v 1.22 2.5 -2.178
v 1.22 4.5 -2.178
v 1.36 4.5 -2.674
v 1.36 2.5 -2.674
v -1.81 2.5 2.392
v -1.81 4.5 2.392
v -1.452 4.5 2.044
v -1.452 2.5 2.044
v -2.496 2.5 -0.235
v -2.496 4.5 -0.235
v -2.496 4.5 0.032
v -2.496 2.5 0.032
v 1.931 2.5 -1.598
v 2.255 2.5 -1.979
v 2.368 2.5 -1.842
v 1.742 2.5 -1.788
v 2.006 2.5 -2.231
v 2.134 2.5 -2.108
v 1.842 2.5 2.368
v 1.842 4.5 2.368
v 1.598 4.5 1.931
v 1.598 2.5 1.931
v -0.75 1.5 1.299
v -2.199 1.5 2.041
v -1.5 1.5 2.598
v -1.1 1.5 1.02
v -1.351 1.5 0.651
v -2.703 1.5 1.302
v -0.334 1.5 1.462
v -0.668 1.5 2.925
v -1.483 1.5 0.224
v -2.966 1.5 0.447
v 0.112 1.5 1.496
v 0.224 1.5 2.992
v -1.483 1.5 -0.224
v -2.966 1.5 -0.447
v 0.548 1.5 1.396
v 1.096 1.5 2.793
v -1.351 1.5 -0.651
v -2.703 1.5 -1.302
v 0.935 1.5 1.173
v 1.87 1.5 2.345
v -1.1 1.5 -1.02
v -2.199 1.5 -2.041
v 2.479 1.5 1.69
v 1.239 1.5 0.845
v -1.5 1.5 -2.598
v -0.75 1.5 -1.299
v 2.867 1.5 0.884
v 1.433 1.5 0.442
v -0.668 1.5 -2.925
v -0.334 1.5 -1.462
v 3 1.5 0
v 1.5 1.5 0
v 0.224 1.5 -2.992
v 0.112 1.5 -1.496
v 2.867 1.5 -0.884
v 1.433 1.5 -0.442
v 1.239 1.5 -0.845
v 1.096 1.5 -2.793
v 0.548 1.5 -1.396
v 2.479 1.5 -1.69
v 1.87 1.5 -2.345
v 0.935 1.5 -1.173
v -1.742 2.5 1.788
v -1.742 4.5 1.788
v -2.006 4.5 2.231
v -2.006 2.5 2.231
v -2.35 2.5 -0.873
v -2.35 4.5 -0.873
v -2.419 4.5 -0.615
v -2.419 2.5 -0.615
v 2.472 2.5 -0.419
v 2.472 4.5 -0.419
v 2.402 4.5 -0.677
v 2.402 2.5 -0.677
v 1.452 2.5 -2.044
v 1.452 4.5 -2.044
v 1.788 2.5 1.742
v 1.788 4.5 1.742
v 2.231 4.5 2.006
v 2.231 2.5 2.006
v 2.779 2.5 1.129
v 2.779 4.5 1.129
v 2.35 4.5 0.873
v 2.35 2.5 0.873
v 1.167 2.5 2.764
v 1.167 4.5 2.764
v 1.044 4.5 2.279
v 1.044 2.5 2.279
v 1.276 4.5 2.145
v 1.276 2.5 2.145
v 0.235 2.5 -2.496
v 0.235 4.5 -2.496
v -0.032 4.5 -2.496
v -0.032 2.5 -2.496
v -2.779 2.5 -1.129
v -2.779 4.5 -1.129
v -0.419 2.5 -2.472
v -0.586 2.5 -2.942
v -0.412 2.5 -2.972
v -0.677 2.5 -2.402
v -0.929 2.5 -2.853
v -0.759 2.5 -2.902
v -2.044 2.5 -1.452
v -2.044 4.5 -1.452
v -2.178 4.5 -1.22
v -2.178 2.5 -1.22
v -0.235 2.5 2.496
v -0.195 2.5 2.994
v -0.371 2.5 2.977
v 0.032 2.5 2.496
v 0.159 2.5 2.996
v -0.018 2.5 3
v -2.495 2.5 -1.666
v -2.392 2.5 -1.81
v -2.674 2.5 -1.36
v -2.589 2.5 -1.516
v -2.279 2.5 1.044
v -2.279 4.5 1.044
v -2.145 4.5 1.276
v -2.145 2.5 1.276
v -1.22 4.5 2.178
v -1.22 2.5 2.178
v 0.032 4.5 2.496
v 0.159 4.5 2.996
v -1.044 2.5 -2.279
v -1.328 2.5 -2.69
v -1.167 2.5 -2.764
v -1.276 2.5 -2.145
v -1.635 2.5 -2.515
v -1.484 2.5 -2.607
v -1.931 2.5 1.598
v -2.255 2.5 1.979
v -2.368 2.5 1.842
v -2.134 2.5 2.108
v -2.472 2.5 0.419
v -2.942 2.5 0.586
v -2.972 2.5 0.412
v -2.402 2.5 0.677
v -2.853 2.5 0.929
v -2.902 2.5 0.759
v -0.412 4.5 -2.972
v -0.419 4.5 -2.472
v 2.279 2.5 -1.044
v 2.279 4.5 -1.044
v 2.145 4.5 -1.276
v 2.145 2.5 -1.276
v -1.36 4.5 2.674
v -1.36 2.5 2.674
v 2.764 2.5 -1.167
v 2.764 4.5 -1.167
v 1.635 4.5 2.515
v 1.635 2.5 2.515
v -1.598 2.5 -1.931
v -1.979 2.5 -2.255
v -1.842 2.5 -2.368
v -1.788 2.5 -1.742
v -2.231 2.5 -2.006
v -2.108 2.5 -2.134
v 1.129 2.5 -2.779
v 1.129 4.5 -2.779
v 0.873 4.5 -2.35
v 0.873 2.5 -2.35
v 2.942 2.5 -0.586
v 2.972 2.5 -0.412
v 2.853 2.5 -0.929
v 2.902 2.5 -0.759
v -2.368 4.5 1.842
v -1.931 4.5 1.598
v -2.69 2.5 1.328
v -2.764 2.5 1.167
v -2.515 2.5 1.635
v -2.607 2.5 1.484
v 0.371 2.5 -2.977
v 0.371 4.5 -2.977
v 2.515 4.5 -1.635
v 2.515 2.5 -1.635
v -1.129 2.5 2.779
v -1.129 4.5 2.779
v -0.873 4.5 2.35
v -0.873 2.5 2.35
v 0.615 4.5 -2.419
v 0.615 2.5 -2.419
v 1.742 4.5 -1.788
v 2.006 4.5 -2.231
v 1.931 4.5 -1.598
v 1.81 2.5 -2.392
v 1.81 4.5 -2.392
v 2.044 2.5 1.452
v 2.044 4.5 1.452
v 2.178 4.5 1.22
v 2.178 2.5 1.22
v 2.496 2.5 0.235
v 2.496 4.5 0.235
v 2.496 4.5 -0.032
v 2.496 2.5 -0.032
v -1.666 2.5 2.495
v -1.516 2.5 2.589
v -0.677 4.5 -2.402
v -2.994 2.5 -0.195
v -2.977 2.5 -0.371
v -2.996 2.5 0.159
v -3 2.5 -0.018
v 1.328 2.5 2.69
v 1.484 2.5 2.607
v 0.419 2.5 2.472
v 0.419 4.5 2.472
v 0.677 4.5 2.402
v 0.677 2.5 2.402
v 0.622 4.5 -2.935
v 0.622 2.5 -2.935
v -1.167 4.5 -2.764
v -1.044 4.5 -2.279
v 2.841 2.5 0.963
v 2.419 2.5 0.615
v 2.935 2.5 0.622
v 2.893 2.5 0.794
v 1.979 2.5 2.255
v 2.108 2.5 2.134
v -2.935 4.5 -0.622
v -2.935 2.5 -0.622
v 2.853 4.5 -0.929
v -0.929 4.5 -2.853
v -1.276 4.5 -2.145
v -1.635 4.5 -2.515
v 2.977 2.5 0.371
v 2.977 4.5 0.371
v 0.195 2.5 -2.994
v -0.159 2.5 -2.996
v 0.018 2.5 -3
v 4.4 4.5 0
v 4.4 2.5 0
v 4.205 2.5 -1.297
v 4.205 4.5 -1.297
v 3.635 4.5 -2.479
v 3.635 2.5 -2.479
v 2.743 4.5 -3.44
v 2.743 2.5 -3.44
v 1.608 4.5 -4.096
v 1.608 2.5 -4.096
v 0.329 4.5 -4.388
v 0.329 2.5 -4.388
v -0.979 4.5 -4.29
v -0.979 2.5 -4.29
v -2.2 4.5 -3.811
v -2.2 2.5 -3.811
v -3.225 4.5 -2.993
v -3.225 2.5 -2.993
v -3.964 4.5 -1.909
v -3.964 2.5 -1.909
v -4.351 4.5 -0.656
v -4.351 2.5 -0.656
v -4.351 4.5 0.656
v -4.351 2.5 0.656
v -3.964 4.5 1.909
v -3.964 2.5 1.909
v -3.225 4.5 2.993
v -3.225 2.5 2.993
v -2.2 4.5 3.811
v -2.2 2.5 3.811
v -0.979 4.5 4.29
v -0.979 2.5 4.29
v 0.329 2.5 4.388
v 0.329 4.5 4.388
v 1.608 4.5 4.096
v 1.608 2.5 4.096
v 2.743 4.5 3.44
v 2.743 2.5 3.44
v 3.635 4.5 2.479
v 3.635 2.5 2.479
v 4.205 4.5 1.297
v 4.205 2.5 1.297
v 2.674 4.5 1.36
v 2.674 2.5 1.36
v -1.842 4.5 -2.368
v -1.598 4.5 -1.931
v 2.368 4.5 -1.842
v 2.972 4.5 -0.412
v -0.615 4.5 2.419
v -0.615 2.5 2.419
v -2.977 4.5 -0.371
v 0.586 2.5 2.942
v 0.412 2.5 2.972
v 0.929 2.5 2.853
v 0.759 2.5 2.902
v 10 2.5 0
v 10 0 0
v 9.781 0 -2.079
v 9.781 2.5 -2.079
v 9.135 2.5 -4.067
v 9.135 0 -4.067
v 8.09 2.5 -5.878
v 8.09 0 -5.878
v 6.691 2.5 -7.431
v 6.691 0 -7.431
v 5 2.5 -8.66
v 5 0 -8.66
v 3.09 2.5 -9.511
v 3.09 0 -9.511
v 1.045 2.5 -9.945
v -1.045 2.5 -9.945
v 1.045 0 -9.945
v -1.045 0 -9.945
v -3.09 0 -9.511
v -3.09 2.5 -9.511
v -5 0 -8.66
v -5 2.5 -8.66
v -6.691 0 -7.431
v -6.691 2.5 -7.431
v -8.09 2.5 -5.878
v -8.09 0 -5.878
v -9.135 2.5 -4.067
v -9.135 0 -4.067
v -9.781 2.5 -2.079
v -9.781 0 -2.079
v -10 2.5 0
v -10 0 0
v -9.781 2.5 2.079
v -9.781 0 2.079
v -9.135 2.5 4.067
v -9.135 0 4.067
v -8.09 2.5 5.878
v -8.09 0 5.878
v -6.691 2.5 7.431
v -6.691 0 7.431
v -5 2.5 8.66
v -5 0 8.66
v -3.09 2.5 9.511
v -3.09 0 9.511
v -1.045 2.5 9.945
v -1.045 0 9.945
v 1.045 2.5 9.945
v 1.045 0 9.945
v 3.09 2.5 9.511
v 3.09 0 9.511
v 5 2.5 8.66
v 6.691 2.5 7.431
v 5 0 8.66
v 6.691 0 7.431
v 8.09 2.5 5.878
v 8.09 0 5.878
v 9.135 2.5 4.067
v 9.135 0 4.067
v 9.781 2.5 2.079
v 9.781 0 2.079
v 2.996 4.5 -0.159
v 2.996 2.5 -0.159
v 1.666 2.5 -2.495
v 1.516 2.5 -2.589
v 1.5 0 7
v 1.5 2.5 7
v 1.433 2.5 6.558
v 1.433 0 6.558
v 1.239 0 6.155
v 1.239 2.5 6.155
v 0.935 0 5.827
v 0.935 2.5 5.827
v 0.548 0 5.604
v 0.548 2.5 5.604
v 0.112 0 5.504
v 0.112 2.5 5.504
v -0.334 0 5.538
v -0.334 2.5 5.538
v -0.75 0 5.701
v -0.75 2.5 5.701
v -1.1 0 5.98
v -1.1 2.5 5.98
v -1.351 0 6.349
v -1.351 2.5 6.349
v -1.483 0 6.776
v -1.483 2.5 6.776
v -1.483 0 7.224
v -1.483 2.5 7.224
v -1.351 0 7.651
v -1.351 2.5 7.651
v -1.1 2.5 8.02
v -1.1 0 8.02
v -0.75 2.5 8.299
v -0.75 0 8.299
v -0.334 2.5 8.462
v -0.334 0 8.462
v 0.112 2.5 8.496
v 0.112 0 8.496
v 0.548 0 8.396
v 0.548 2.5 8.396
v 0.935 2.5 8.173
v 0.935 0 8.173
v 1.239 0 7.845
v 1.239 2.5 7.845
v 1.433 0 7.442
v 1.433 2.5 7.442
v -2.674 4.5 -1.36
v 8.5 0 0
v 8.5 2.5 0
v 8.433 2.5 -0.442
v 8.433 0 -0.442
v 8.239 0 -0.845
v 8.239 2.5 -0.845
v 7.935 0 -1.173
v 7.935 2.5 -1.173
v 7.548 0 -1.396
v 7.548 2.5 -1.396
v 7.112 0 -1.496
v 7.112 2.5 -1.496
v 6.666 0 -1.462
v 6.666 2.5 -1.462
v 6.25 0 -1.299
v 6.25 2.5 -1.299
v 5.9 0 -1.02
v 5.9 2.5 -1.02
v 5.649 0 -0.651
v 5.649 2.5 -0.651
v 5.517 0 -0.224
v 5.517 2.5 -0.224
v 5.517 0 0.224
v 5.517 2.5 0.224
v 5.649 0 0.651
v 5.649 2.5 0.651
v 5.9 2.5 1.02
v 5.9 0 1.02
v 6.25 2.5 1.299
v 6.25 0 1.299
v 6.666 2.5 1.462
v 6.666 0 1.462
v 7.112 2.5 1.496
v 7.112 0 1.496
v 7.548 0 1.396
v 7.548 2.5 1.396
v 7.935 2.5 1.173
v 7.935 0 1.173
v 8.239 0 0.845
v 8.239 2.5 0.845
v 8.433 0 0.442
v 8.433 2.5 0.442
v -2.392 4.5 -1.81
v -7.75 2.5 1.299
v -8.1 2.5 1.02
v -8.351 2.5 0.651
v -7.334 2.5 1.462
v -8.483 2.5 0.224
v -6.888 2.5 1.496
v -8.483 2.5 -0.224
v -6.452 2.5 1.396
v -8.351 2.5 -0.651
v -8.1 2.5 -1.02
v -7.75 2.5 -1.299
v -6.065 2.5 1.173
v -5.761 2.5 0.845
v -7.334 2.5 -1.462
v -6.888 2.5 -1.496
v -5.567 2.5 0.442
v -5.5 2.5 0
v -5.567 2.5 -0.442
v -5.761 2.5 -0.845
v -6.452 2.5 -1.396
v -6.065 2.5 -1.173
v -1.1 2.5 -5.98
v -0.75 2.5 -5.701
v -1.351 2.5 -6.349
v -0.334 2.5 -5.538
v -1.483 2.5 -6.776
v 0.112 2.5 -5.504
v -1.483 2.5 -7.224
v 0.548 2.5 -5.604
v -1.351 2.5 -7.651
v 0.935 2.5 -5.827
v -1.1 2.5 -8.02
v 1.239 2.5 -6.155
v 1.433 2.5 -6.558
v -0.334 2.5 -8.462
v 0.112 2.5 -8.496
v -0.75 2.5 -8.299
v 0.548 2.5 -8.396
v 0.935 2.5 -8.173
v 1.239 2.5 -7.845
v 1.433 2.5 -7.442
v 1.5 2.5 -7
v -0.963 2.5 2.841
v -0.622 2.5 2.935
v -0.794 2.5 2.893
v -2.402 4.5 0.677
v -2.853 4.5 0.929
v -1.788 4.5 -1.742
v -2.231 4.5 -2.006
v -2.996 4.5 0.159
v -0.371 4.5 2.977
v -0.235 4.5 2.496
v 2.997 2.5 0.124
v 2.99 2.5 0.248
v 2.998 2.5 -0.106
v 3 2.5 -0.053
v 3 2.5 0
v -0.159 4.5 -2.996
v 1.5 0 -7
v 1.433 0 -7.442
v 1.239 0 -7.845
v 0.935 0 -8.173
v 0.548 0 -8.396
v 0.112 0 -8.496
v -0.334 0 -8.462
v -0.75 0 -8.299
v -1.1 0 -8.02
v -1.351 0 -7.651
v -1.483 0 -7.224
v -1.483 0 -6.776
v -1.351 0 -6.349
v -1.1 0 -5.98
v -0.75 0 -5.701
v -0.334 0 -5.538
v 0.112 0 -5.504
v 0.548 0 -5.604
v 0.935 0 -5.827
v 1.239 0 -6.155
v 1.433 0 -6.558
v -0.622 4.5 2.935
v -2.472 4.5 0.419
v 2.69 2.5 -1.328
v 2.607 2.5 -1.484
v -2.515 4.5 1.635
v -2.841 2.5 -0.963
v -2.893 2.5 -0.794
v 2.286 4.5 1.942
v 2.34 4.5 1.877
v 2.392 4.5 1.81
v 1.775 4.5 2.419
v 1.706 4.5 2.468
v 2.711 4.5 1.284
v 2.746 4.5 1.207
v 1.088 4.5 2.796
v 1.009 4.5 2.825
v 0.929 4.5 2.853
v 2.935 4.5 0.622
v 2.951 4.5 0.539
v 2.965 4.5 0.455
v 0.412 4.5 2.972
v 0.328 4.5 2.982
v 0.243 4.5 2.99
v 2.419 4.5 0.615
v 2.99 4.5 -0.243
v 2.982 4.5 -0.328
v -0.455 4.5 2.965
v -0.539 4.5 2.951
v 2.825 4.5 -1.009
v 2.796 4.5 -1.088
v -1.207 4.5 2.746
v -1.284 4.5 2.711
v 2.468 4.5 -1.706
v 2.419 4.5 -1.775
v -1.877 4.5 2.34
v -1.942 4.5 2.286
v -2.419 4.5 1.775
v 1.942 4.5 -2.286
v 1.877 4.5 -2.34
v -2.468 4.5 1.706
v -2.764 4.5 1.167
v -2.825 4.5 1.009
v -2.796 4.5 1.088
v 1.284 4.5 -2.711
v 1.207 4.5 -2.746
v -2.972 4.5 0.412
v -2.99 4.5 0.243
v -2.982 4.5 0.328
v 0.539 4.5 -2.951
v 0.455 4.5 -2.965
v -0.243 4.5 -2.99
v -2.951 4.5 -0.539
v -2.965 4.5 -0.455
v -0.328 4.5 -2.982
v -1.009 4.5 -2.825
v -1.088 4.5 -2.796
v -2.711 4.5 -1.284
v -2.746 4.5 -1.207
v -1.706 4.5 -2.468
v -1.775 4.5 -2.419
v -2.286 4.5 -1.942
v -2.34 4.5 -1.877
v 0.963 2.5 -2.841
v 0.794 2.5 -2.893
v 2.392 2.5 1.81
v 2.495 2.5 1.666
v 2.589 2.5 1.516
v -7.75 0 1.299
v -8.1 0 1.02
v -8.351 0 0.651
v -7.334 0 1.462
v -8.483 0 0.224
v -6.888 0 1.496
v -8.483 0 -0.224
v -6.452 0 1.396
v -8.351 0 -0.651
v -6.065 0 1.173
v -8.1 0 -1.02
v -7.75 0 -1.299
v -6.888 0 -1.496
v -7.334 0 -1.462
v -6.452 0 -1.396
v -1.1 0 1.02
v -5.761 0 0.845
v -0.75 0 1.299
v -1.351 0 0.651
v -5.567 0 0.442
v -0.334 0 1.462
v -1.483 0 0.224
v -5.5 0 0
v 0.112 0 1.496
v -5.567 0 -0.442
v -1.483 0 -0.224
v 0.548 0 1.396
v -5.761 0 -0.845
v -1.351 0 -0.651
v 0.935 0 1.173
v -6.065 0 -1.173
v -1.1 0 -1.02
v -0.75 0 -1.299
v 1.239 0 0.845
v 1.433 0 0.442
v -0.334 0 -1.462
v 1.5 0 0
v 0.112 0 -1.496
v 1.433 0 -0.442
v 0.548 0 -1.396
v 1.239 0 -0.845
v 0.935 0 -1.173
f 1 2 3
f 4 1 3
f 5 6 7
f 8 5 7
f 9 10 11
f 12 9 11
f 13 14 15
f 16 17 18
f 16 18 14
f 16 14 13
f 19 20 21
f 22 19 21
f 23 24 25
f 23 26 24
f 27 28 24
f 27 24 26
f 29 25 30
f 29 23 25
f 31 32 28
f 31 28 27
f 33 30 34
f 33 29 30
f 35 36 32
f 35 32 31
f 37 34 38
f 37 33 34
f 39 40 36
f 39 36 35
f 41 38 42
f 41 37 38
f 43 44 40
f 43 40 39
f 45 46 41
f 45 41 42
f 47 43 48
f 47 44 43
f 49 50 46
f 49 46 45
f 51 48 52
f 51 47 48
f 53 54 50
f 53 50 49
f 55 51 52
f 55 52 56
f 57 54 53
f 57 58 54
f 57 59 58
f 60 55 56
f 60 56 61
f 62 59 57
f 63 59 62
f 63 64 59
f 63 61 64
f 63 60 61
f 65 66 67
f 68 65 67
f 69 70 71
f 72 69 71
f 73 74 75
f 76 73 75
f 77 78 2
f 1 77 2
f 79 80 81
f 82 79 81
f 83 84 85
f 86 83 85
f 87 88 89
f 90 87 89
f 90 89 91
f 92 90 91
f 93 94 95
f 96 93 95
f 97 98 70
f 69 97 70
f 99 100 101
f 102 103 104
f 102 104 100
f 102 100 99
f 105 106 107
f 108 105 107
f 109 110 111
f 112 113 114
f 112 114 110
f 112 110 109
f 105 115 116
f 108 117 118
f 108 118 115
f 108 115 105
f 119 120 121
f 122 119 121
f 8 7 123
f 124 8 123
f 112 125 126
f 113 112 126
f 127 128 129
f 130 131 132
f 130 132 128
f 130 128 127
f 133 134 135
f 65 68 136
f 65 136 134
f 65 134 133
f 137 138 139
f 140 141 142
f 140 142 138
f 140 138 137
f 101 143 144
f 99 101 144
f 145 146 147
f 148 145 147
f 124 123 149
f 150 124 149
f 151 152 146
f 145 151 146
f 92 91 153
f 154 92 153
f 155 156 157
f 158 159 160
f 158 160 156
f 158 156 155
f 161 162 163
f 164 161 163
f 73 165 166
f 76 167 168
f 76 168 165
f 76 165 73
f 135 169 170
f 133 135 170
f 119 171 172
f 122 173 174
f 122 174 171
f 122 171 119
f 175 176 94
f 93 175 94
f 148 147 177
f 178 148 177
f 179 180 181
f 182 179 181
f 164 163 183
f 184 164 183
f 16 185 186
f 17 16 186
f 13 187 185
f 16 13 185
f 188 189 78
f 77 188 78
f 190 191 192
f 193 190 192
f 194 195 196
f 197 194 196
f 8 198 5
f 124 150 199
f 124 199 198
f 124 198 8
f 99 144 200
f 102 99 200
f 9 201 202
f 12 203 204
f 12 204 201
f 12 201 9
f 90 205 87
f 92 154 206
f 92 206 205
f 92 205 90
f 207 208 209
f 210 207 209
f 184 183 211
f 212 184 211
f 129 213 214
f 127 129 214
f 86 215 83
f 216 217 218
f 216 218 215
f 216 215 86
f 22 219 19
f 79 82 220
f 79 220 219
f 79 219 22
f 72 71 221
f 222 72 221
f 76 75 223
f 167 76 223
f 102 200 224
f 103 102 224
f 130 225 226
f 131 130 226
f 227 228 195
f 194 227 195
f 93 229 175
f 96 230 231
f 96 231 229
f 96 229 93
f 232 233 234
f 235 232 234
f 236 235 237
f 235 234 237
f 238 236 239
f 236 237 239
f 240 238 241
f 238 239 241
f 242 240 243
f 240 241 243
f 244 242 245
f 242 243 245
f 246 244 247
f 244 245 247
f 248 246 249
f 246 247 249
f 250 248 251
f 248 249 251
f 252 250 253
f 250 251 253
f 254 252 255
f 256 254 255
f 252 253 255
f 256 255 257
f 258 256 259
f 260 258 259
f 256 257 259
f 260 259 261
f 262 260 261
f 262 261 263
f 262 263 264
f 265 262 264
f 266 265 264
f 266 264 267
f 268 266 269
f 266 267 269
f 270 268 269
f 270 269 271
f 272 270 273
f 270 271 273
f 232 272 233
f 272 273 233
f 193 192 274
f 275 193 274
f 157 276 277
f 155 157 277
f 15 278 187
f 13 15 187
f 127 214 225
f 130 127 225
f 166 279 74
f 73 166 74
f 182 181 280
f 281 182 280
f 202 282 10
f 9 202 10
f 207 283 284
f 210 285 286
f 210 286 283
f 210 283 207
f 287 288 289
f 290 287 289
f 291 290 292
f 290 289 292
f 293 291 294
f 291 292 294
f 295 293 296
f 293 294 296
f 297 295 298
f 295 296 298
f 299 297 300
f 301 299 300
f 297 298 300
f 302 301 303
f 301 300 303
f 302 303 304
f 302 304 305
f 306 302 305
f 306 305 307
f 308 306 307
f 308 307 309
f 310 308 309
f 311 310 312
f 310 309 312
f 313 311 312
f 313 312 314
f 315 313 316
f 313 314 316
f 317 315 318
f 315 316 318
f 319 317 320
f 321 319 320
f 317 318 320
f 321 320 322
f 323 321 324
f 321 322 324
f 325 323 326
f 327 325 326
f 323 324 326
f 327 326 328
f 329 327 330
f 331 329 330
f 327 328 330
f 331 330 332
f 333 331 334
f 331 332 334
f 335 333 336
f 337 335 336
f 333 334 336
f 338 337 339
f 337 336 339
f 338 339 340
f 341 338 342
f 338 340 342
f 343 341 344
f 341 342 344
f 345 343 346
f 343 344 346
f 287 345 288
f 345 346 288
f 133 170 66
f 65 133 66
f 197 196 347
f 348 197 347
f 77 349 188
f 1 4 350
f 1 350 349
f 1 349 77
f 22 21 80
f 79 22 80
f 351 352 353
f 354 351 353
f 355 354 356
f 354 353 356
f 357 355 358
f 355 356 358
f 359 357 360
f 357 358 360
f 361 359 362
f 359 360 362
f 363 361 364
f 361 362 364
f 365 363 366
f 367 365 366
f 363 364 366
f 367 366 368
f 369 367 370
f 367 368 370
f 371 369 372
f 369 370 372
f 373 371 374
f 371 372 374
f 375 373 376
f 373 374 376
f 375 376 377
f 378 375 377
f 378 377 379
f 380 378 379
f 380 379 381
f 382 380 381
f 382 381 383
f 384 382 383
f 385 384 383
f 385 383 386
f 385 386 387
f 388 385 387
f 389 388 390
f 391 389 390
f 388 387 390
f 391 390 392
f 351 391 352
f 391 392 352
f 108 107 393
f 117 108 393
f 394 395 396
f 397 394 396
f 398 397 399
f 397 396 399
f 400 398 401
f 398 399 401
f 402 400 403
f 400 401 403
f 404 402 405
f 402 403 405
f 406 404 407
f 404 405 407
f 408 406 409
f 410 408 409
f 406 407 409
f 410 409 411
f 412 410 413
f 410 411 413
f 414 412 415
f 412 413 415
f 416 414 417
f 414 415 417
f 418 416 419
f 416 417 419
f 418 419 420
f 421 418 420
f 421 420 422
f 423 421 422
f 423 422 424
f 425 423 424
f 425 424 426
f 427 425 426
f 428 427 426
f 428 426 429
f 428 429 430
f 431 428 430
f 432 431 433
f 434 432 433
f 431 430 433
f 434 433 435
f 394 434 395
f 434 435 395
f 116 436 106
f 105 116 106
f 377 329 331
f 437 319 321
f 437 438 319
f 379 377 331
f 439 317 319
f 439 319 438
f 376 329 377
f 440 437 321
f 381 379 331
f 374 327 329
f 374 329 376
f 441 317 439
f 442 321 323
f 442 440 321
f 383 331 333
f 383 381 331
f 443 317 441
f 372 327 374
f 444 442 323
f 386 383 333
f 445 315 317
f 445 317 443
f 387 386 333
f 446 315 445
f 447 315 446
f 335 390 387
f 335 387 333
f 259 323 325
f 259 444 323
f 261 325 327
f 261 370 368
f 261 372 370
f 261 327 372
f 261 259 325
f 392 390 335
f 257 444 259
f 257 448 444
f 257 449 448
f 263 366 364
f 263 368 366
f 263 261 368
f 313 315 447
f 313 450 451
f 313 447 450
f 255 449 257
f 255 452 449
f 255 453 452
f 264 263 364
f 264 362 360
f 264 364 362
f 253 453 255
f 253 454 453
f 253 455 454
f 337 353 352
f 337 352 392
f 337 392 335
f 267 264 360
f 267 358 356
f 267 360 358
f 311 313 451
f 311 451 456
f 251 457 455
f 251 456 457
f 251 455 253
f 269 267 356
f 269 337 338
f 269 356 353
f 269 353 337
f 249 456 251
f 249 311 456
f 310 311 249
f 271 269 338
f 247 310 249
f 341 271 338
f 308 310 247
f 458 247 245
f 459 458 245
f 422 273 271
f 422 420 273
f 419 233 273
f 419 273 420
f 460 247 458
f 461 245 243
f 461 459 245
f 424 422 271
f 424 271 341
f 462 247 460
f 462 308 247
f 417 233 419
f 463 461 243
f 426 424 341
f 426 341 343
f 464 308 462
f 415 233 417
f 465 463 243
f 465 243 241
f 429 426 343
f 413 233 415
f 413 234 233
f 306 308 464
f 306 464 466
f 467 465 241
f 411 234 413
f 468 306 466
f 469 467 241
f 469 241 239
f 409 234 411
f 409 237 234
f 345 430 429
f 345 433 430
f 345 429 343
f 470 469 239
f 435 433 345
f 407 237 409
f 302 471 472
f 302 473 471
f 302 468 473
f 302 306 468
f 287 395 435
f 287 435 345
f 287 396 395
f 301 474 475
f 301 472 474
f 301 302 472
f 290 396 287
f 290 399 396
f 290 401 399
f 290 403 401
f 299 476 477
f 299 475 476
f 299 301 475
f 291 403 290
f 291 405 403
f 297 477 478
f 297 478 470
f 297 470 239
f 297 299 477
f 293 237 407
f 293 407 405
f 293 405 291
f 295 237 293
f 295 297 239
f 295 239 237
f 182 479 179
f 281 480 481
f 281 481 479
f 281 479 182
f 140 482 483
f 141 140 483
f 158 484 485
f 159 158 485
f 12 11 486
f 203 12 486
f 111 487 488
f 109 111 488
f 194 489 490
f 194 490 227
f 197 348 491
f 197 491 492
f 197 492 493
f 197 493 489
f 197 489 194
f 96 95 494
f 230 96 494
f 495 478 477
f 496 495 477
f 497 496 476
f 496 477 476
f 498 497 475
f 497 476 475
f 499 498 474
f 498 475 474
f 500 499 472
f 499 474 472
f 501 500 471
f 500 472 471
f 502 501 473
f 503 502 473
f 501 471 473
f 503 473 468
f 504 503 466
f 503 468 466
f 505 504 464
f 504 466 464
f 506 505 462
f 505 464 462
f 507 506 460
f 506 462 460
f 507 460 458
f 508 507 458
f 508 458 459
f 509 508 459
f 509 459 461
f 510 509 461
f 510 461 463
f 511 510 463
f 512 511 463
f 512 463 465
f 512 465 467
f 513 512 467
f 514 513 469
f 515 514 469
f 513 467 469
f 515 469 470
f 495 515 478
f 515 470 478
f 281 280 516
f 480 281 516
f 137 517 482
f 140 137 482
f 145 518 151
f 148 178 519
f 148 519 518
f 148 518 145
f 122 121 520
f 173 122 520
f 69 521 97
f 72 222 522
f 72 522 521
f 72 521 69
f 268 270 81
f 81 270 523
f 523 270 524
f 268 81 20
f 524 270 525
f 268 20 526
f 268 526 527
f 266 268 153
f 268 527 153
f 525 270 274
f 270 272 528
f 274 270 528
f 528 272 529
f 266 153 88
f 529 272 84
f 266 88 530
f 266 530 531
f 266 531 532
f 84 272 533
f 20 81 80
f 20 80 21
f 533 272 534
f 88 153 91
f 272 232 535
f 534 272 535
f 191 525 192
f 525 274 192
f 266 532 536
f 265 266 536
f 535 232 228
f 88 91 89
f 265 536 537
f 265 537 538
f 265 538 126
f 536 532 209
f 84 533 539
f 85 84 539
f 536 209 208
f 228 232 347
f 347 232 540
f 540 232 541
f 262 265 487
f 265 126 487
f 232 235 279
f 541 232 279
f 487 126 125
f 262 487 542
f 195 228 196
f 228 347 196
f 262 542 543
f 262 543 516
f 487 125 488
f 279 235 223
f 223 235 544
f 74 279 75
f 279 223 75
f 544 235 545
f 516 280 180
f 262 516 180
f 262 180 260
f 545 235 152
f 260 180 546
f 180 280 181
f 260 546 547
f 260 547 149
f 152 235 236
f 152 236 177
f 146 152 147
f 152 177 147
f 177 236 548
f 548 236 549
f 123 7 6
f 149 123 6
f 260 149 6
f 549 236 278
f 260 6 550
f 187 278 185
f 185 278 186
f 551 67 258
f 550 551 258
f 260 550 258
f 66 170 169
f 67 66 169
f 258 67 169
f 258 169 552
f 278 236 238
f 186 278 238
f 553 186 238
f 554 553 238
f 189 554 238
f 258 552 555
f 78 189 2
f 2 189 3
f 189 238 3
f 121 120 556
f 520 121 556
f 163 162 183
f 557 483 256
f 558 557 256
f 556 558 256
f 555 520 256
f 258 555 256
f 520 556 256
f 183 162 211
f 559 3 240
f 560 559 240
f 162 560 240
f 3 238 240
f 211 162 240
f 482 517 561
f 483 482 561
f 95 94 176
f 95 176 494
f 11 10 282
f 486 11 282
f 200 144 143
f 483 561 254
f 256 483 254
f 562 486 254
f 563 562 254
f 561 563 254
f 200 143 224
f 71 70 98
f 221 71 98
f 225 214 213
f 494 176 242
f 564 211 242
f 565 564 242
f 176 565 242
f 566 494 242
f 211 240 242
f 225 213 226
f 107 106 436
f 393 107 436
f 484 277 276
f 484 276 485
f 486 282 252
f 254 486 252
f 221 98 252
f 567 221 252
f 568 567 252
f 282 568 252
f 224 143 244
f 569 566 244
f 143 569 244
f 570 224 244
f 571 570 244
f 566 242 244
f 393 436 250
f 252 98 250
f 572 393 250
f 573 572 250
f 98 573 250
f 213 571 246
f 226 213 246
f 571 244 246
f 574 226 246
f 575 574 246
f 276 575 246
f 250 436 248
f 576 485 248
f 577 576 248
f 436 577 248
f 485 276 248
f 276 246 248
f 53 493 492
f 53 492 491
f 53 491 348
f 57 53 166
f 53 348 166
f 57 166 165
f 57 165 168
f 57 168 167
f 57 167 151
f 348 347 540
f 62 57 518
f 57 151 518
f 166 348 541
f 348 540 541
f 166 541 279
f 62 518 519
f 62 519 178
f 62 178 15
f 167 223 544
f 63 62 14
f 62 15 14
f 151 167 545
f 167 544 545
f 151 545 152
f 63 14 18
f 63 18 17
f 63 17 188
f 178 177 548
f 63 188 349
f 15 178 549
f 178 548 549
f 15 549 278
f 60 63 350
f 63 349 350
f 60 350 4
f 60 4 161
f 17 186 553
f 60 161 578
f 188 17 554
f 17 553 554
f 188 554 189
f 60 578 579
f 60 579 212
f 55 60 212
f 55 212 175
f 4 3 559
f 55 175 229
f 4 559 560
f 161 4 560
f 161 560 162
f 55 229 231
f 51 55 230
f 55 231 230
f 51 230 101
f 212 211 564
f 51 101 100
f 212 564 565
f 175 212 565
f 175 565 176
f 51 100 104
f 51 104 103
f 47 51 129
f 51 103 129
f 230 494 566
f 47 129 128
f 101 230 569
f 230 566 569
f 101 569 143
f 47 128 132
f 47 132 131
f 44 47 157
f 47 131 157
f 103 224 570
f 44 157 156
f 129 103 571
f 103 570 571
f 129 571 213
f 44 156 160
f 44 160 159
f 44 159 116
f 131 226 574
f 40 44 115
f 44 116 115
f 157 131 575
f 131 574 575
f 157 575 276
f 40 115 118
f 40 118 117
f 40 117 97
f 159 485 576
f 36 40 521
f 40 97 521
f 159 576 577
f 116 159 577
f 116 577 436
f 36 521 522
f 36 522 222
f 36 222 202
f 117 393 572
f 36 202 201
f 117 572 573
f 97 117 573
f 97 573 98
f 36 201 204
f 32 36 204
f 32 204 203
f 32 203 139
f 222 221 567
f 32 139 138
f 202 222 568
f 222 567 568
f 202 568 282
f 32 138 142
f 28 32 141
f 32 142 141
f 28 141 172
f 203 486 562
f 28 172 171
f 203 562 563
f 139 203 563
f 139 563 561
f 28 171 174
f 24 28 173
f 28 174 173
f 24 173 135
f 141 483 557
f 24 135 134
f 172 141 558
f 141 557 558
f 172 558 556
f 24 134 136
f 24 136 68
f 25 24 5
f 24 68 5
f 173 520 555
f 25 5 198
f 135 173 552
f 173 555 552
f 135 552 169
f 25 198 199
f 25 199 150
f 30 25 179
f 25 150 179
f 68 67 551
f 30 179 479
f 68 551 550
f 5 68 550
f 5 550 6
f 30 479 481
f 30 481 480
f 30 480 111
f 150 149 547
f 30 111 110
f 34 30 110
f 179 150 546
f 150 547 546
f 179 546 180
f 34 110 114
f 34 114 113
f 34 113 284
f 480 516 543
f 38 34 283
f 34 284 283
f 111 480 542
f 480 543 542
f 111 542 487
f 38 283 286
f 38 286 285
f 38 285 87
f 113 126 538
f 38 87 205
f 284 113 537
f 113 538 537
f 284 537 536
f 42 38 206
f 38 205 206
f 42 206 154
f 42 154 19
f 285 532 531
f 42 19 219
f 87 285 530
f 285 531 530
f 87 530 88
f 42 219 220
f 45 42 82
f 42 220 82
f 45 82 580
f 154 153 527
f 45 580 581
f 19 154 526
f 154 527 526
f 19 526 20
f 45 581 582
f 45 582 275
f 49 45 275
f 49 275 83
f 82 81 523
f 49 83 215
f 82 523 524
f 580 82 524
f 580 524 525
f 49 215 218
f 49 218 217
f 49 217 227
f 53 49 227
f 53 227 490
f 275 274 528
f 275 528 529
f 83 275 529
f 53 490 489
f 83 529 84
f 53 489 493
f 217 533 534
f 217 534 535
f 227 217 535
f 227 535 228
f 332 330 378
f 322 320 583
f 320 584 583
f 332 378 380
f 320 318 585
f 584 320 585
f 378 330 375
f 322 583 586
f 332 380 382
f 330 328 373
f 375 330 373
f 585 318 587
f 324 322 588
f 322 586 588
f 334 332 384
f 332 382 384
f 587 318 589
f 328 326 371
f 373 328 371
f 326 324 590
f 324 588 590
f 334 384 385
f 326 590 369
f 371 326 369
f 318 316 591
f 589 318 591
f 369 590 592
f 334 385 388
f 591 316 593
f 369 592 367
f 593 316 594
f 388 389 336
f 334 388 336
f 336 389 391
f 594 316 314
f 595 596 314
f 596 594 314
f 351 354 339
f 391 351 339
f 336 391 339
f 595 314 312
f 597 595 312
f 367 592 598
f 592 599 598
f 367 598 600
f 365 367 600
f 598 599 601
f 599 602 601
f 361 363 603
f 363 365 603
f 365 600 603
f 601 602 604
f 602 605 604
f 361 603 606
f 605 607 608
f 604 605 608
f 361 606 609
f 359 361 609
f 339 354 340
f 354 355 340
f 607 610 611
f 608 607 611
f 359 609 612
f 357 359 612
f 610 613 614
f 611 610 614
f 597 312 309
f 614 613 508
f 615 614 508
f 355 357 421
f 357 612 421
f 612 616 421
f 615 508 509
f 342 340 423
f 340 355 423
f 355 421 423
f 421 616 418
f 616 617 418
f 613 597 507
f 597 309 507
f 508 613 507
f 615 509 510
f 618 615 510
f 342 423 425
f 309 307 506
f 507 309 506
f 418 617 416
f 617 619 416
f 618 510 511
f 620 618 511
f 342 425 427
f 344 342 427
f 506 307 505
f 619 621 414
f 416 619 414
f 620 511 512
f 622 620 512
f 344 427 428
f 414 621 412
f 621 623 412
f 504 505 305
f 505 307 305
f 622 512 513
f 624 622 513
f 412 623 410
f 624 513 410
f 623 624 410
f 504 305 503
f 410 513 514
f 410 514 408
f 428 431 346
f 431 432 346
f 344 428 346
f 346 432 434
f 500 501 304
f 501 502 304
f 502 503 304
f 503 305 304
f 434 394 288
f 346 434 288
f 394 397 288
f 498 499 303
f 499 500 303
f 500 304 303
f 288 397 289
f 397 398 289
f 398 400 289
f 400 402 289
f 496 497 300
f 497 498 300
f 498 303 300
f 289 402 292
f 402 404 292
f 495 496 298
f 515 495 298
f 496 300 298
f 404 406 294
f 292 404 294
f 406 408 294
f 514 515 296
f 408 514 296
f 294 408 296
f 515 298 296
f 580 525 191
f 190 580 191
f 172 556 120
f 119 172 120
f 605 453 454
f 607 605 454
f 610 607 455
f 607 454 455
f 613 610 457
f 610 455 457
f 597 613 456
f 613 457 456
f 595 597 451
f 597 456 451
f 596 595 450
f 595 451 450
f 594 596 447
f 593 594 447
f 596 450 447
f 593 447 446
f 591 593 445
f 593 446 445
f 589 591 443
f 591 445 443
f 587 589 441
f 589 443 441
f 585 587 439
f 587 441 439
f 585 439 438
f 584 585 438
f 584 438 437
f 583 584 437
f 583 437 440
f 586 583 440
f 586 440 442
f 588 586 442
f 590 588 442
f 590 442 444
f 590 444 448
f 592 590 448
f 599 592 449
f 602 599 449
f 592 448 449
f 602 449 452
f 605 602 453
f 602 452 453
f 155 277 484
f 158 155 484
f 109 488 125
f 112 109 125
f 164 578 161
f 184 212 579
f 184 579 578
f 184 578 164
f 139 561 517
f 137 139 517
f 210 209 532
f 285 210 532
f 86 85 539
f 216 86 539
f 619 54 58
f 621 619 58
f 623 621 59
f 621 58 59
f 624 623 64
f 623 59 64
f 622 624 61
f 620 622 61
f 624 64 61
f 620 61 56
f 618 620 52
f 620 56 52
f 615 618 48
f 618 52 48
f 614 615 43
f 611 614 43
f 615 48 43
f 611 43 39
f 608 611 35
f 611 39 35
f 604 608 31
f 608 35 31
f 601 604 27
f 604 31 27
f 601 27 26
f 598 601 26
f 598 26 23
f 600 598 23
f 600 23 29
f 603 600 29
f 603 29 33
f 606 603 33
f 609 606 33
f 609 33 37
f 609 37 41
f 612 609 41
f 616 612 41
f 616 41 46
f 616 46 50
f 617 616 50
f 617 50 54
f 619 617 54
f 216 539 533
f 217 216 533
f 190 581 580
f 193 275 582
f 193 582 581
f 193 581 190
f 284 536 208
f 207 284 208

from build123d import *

# Parameters (mm, degrees)
SKETCH_4_R               = 10
EXTRUDE_2_DEPTH          = 2.5
SKETCH_6_R               = 1.5
CUT_EXTRUDE_9_DEPTH      = 2.5
SKETCH_7_R               = 4.4
EXTRUDE_3_DEPTH          = 2
SKETCH_8_R               = 3
CUT_EXTRUDE_10_DEPTH     = 3
EXTRUDE_5_DEPTH          = 2
PATTERN_CIRCULAR_1_COUNT = 24


with BuildPart() as part:
    # 草图4 → 凸台-拉伸2 (new body)
    with BuildSketch(Plane(origin=(0, 0, 0), x_dir=(1, 0, 0), z_dir=(0, 1, 0))):
        Circle(SKETCH_4_R)
    extrude(amount=EXTRUDE_2_DEPTH)

    # 草图6 → 切除-拉伸9 (cut)
    with BuildSketch(Plane(origin=(0, 2.5, 0), x_dir=(1, 0, 0), z_dir=(0, 1, 0))):
        with Locations((0, 7)):
            Circle(SKETCH_6_R)
        Circle(SKETCH_6_R)
        with Locations((7, 0)):
            Circle(SKETCH_6_R)
        with Locations((-7, 0)):
            Circle(SKETCH_6_R)
        with Locations((0, -7)):
            Circle(SKETCH_6_R)
    extrude(amount=-CUT_EXTRUDE_9_DEPTH, mode=Mode.SUBTRACT)

    # 草图7 → 凸台-拉伸3 (add)
    with BuildSketch(Plane(origin=(0, 2.5, 0), x_dir=(1, 0, 0), z_dir=(0, 1, 0))):
        Circle(SKETCH_7_R)
    extrude(amount=EXTRUDE_3_DEPTH)

    # 草图8 → 切除-拉伸10 (cut)
    with BuildSketch(Plane(origin=(0, 4.5, 0), x_dir=(1, 0, 0), z_dir=(0, 1, 0))):
        Circle(SKETCH_8_R)
    extrude(amount=-CUT_EXTRUDE_10_DEPTH, mode=Mode.SUBTRACT)

    # 草图14 → 凸台-拉伸5 (add)
    with BuildSketch(Plane(origin=(0, 4.5, 0), x_dir=(1, 0, 0), z_dir=(0, 1, 0))):
        with BuildLine():
            Line((2.976910005, -0.371492698), (2.495792863, -0.23538136))
            Line((2.495792863, -0.23538136), (2.495792863, 0.032272898))
            Line((2.495792863, 0.032272898), (2.995792863, 0.158824181))
            ThreePointArc((2.995792863, 0.158824181), (2.998100046, -0.106752588), (2.976910005, -0.371492698))
        make_face()
    extrude_5 = extrude(amount=-EXTRUDE_5_DEPTH)

    # 阵列(圆周)1: 凸台-拉伸5 ×24 about axis
    pattern_circular_1_axis = Axis((0, 4.5, 0), (0, 1, 0))
    for i in range(1, PATTERN_CIRCULAR_1_COUNT):
        add(extrude_5.rotate(pattern_circular_1_axis, i * 360 / PATTERN_CIRCULAR_1_COUNT))


solid = part.part
